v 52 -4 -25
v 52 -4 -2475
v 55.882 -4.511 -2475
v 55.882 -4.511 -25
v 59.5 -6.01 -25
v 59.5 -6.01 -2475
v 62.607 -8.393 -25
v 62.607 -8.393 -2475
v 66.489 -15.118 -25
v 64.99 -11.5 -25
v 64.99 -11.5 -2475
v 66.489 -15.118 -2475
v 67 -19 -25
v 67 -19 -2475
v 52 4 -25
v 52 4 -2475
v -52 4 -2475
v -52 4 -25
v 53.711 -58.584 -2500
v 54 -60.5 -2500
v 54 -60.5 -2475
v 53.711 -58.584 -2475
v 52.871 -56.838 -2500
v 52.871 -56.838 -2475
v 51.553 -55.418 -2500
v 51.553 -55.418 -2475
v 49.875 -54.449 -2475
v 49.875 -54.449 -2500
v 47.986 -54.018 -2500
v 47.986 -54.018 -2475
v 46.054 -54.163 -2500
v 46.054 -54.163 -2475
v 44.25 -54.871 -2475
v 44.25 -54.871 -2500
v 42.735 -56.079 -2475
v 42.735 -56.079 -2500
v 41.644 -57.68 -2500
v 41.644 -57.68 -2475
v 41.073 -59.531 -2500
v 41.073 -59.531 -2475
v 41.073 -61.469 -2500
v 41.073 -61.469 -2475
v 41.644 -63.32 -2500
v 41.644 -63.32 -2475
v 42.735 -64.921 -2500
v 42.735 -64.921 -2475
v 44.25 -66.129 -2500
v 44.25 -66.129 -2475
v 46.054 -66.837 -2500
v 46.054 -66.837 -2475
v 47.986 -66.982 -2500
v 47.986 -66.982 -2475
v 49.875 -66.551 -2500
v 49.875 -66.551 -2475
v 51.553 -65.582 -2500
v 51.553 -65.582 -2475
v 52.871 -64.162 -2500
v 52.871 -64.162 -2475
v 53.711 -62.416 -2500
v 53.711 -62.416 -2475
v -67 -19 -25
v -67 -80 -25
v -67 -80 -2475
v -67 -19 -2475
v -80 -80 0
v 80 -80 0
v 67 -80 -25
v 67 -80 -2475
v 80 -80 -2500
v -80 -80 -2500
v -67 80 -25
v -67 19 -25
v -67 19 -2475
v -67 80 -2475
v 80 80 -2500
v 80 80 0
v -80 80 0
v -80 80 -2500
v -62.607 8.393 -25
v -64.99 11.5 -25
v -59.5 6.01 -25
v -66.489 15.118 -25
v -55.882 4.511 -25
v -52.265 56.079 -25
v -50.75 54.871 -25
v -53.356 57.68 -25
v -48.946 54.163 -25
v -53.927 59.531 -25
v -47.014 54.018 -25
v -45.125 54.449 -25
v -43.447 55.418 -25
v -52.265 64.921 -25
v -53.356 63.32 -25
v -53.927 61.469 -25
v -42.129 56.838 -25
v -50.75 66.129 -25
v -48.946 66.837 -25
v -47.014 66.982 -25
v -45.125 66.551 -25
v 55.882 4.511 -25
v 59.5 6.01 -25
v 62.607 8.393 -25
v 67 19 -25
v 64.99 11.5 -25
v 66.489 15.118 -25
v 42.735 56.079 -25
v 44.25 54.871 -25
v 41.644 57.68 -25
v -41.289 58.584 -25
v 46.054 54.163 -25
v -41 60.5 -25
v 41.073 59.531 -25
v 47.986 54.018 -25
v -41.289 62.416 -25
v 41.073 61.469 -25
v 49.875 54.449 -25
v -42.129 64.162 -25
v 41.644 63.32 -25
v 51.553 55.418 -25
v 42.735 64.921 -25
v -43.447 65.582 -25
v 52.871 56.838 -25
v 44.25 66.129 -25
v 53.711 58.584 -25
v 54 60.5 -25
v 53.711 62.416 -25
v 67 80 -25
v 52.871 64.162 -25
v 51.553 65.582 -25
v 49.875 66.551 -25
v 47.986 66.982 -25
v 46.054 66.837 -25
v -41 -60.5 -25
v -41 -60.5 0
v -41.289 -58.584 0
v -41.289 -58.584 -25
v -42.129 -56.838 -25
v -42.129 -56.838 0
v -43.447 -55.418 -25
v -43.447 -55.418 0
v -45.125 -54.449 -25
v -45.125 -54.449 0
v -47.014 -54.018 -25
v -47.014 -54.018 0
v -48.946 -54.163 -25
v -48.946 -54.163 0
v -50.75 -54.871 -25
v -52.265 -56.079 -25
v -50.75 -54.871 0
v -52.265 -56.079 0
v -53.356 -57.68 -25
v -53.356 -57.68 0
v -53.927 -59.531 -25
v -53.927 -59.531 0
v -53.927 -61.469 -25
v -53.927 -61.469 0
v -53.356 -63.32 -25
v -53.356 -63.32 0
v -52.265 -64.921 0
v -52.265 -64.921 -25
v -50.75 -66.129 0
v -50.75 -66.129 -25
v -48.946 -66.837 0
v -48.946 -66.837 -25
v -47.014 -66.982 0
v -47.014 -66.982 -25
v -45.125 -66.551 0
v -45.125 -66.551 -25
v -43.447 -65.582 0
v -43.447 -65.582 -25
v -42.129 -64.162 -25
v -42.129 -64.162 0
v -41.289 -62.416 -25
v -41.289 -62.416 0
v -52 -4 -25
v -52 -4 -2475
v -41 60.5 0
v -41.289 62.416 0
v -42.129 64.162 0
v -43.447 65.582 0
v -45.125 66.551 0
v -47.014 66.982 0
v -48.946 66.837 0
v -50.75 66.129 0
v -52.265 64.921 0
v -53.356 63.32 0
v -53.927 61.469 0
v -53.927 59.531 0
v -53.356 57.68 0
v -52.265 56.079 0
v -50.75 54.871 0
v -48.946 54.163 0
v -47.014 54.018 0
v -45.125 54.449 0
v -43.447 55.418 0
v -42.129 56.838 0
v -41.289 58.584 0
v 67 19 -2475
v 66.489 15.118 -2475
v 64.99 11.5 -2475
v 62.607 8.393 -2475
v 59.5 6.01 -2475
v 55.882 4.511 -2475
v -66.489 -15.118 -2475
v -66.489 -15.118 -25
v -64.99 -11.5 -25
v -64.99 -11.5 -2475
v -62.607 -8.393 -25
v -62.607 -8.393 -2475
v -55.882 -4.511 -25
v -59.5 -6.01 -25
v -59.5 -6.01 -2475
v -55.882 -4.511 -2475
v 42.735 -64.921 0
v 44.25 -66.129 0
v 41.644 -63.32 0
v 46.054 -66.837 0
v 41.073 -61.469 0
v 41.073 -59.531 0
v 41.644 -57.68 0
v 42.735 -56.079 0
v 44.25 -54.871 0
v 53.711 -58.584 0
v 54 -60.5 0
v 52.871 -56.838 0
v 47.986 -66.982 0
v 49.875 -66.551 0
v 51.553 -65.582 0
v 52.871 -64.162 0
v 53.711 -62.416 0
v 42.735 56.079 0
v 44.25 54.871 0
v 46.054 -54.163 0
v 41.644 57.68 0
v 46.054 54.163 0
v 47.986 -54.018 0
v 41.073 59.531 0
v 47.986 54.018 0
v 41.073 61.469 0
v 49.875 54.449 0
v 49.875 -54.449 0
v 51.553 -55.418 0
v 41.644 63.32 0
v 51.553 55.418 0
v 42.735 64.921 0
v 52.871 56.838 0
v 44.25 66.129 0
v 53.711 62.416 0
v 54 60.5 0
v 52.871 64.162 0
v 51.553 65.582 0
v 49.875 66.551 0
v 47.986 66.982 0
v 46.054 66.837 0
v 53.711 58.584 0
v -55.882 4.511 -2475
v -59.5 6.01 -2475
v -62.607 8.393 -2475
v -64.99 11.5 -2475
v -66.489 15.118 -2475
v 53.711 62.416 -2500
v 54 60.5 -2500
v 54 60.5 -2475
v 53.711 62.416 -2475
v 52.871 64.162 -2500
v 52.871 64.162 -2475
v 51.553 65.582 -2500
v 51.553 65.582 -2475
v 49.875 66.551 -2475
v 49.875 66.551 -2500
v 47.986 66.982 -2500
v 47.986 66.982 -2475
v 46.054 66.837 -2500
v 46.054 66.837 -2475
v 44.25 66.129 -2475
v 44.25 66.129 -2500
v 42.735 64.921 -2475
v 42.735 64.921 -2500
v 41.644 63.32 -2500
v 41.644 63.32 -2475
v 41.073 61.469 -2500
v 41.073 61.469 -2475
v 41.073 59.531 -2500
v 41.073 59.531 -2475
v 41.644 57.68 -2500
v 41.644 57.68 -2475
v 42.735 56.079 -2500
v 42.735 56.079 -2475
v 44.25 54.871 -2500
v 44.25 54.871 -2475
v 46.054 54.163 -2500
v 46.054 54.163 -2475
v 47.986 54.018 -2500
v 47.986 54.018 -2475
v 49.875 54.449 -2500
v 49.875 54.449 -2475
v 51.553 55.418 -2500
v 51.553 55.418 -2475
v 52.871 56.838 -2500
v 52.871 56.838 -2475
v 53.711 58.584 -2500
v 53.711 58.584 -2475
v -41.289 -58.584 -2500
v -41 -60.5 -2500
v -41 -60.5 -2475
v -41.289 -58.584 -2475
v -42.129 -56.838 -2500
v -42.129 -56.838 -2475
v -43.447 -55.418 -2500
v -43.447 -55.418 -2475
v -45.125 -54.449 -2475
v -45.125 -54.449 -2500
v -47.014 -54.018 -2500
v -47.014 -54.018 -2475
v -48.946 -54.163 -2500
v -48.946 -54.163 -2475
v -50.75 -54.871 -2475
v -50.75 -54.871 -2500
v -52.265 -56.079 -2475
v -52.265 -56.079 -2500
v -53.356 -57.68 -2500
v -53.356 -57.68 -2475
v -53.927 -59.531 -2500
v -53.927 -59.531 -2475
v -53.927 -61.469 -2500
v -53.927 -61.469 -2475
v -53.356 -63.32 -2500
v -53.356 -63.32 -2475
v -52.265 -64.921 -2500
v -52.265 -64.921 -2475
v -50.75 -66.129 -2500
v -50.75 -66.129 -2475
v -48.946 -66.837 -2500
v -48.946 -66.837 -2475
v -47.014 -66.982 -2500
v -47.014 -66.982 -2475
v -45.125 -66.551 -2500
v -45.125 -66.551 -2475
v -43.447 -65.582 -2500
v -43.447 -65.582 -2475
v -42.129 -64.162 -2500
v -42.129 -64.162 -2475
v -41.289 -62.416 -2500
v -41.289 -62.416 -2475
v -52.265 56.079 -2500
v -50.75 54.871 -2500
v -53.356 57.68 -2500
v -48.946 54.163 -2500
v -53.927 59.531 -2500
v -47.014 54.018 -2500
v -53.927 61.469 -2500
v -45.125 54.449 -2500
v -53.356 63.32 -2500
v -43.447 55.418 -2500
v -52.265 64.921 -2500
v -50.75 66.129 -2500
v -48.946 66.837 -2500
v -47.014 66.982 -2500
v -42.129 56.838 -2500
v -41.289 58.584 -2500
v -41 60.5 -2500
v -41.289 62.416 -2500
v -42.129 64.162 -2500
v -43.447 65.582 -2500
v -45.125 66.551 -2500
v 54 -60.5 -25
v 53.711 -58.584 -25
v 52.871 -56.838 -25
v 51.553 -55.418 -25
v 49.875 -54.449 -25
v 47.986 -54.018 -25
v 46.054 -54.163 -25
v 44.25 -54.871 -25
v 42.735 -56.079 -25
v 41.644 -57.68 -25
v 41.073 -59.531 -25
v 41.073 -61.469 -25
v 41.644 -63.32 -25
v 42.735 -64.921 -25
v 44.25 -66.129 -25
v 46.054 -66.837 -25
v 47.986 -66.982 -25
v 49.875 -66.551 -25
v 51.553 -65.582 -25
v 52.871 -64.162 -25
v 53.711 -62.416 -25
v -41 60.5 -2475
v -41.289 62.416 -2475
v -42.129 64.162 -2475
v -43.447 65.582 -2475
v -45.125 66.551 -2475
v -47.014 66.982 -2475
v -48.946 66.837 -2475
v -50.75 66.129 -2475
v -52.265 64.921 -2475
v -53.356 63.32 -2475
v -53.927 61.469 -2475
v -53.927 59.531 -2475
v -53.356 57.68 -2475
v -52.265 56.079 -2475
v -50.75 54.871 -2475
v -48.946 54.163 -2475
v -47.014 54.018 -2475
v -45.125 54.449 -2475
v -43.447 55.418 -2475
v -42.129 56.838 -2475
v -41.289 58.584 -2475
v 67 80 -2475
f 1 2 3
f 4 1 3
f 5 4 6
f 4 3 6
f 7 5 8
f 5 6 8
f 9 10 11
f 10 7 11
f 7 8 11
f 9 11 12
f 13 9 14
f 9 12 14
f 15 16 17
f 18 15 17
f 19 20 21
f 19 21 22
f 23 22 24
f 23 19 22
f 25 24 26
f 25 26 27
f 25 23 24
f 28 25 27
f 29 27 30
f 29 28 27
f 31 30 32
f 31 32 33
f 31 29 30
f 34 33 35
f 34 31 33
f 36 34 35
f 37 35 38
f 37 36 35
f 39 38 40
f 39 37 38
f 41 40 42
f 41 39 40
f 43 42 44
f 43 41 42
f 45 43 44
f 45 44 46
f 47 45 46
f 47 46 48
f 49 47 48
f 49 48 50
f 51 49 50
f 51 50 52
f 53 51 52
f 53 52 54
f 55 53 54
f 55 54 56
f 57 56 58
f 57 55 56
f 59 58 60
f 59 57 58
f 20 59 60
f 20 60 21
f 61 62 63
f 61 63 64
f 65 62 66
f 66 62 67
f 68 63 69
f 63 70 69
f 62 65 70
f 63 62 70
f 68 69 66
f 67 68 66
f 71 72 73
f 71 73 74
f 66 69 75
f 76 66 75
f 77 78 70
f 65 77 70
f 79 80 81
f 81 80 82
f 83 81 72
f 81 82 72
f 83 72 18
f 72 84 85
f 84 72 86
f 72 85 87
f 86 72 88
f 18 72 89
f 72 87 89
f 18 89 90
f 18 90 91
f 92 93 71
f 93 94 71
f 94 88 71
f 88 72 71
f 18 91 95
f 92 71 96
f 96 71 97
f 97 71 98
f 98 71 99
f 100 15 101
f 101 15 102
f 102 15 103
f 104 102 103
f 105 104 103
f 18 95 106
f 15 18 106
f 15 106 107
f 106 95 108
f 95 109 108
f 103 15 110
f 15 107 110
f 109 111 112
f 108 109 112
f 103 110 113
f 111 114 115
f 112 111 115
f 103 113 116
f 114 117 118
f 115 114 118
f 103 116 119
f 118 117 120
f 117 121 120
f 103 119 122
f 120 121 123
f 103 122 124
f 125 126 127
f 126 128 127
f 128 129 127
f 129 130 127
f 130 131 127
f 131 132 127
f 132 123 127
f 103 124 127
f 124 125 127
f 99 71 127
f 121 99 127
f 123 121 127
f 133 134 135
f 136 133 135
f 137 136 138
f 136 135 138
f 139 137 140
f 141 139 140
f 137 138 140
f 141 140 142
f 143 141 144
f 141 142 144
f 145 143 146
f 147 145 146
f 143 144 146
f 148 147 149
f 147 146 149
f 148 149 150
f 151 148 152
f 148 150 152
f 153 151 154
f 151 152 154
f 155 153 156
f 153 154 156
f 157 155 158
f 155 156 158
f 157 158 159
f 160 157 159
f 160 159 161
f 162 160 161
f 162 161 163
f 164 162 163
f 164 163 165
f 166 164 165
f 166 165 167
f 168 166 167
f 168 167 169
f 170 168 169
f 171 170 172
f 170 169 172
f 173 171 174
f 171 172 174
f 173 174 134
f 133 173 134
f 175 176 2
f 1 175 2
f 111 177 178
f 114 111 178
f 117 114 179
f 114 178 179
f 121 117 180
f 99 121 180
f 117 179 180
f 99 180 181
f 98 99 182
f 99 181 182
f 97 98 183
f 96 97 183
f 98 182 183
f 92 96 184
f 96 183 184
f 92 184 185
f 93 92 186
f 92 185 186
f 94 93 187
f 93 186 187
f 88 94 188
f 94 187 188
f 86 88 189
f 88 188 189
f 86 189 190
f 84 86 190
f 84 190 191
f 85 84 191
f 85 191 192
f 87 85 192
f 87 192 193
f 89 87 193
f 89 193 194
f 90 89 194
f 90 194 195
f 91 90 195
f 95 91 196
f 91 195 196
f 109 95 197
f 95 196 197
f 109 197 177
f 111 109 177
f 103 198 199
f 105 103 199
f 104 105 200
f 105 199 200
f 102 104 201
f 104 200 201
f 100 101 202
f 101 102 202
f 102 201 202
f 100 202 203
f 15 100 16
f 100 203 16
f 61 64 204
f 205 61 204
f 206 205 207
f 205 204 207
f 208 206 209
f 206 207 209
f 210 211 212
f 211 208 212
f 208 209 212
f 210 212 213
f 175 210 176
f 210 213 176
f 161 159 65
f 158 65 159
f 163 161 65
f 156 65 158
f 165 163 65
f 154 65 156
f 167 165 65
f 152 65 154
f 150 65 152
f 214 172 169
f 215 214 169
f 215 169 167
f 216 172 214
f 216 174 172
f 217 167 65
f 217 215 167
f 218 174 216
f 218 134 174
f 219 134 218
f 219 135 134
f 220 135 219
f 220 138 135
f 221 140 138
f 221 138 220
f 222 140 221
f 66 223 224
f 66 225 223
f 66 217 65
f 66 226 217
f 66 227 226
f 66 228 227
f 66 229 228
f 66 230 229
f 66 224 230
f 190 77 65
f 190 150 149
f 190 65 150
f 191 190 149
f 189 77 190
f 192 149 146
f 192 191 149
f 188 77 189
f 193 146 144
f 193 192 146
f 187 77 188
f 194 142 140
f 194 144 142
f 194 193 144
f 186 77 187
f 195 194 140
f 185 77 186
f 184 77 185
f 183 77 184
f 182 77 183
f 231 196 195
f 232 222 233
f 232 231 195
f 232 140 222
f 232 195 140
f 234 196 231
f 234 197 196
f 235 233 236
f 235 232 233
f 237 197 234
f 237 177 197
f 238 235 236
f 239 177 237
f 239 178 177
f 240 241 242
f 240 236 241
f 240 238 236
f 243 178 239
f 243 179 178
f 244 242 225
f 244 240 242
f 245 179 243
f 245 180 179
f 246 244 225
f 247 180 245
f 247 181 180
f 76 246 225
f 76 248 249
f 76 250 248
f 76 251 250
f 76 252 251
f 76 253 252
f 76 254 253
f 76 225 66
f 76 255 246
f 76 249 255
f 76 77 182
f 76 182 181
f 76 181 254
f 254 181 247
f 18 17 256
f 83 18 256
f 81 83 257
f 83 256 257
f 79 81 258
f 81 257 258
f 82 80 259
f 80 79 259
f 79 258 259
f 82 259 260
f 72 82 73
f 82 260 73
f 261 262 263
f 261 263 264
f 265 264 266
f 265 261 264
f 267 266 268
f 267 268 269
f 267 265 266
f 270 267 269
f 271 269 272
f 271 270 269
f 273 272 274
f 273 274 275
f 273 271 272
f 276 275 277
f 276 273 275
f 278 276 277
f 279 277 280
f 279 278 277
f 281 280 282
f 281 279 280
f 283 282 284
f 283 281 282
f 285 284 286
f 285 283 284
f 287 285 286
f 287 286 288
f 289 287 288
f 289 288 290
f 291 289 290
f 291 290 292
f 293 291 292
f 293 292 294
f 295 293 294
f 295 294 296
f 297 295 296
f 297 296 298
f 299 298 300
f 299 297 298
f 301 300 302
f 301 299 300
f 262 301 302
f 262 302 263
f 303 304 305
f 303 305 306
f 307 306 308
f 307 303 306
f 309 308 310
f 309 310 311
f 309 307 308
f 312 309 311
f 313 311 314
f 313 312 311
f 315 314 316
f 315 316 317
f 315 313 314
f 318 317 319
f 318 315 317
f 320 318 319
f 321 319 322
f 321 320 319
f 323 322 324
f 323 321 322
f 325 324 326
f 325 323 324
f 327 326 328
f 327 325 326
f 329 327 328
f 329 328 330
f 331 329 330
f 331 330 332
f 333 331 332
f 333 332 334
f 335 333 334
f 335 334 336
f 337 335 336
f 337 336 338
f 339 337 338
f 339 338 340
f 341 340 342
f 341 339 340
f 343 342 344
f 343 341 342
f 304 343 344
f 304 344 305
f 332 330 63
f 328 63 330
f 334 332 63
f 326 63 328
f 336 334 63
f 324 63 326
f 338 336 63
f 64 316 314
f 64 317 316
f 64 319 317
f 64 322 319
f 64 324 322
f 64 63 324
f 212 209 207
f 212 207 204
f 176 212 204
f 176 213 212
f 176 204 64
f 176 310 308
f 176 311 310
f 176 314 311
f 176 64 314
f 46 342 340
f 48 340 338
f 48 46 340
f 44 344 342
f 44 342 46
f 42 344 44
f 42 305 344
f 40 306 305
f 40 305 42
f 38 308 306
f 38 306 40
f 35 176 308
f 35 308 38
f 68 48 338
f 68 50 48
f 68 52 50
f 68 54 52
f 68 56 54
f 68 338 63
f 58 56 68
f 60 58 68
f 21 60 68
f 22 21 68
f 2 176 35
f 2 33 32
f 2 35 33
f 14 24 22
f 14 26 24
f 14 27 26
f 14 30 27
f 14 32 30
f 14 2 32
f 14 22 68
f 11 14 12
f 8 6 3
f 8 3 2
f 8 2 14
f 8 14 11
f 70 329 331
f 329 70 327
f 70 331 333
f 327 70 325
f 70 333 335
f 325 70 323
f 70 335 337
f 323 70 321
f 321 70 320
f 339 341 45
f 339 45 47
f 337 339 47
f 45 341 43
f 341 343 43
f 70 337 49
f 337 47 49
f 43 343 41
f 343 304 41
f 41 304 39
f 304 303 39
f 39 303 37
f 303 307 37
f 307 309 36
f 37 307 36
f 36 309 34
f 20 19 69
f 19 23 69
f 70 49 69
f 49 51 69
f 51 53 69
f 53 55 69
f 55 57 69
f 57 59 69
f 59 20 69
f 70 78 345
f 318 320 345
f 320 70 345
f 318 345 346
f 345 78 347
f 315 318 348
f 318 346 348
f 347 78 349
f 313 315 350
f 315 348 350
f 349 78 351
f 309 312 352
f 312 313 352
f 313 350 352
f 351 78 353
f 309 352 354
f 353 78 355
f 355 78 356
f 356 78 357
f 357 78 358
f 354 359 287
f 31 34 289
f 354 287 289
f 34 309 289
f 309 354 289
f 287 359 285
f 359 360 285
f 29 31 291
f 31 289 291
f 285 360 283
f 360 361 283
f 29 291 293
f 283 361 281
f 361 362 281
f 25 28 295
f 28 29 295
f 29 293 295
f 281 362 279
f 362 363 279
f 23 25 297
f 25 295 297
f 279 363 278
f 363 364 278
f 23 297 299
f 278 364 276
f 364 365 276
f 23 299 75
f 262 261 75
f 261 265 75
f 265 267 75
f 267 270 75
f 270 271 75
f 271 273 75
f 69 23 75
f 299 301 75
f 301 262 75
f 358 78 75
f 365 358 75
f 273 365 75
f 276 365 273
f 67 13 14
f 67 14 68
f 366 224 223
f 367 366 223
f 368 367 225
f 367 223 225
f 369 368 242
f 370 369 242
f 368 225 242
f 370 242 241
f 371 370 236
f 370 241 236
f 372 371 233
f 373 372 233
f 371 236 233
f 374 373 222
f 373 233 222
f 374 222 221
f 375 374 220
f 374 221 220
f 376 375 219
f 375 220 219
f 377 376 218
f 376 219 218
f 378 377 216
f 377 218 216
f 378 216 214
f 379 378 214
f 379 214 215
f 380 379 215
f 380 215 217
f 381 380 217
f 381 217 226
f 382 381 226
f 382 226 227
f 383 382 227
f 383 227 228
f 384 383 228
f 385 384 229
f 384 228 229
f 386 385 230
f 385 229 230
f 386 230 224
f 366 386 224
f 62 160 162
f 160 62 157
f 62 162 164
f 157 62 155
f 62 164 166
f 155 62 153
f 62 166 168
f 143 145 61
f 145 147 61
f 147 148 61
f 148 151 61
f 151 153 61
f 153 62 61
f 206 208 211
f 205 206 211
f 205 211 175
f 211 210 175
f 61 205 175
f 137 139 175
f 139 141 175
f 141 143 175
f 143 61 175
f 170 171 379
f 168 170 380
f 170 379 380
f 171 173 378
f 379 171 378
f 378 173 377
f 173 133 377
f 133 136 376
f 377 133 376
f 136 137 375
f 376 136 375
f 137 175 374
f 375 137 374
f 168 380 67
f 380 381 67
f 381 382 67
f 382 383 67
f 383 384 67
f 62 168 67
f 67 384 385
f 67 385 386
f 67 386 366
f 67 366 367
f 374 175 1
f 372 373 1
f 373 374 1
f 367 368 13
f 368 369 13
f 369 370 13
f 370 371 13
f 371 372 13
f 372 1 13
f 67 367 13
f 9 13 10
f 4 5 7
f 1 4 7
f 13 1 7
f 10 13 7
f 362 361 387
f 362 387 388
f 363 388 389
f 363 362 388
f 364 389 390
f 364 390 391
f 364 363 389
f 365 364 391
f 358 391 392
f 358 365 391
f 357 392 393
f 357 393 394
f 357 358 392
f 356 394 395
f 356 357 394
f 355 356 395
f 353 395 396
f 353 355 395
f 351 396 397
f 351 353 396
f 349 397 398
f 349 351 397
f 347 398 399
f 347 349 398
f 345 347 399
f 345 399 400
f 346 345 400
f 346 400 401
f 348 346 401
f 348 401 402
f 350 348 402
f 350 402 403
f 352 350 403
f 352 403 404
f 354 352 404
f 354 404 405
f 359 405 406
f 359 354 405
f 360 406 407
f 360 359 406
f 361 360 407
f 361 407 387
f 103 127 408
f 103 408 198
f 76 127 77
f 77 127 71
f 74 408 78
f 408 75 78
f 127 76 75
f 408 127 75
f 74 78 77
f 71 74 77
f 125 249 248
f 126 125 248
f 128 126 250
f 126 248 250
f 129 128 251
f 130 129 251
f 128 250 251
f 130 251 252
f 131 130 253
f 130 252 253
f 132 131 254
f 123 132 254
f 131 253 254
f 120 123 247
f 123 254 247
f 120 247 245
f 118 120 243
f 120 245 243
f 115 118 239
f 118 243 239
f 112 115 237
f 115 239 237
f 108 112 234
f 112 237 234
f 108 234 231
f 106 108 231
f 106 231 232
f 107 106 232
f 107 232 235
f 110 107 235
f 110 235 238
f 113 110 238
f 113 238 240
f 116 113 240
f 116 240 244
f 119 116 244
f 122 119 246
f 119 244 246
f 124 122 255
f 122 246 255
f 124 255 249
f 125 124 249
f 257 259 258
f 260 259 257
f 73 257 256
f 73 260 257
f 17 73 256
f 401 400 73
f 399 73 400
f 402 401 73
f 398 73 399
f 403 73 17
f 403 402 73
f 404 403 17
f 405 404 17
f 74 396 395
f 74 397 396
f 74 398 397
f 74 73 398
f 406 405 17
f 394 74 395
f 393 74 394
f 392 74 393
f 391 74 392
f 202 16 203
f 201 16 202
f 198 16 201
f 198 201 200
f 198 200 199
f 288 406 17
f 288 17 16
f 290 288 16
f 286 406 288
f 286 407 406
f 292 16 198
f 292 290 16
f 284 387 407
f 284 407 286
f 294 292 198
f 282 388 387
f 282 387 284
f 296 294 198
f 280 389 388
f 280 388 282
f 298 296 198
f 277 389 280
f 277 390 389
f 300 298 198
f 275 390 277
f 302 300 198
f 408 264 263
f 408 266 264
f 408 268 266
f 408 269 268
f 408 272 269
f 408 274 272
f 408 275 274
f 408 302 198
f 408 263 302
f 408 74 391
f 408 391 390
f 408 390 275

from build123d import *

# Parameters (mm, degrees)
F2_DEPTH = 1250
F1_R     = 6.5
F3_DEPTH = 25


with BuildPart() as f2:
    # F1 (on Top) → F2 (new body)
    with BuildSketch(Plane.XY):
        with BuildLine():
            Line((-80, 80), (-80, -80))
            Line((-80, -80), (-67, -80))
            Line((-67, -80), (-67, -19))
            ThreePointArc((-67, -19), (-62.6066017178, -8.3933982822), (-52, -4))
            Line((-52, -4), (52, -4))
            ThreePointArc((52, -4), (62.6066017178, -8.3933982822), (67, -19))
            Line((67, -19), (67, -80))
            Line((67, -80), (80, -80))
            Line((80, -80), (80, 80))
            Line((80, 80), (67, 80))
            Line((67, 80), (67, 19))
            ThreePointArc((67, 19), (62.6066017178, 8.3933982822), (52, 4))
            Line((52, 4), (-52, 4))
            ThreePointArc((-52, 4), (-62.6066017178, 8.3933982822), (-67, 19))
            Line((-67, 19), (-67, 80))
            Line((-67, 80), (-80, 80))
        make_face()
    extrude(amount=-F2_DEPTH)

    # F1 (on Top) → F3 (join)
    with BuildSketch(Plane.XY):
        with BuildLine():
            Line((67, 80), (-67, 80))
            Line((-67, 80), (-67, 19))
            ThreePointArc((-67, 19), (-62.6066017178, 8.3933982822), (-52, 4))
            Line((-52, 4), (52, 4))
            ThreePointArc((52, 4), (62.6066017178, 8.3933982822), (67, 19))
            Line((67, 19), (67, 80))
        make_face()
        with Locations((-47.5, 60.5)):
            Circle(F1_R, mode=Mode.SUBTRACT)
        with Locations((47.5, 60.5)):
            Circle(F1_R, mode=Mode.SUBTRACT)
        with BuildLine():
            Line((-80, 80), (-80, -80))
            Line((-80, -80), (-67, -80))
            Line((-67, -80), (-67, -19))
            ThreePointArc((-67, -19), (-62.6066017178, -8.3933982822), (-52, -4))
            Line((-52, -4), (52, -4))
            ThreePointArc((52, -4), (62.6066017178, -8.3933982822), (67, -19))
            Line((67, -19), (67, -80))
            Line((67, -80), (80, -80))
            Line((80, -80), (80, 80))
            Line((80, 80), (67, 80))
            Line((67, 80), (67, 19))
            ThreePointArc((67, 19), (62.6066017178, 8.3933982822), (52, 4))
            Line((52, 4), (-52, 4))
            ThreePointArc((-52, 4), (-62.6066017178, 8.3933982822), (-67, 19))
            Line((-67, 19), (-67, 80))
            Line((-67, 80), (-80, 80))
        make_face()
        with BuildLine():
            Line((-67, -19), (-67, -80))
            Line((-67, -80), (67, -80))
            Line((67, -80), (67, -19))
            ThreePointArc((67, -19), (62.6066017178, -8.3933982822), (52, -4))
            Line((52, -4), (-52, -4))
            ThreePointArc((-52, -4), (-62.6066017178, -8.3933982822), (-67, -19))
        make_face()
        with Locations((-47.5, -60.5)):
            Circle(F1_R, mode=Mode.SUBTRACT)
        with Locations((47.5, -60.5)):
            Circle(F1_R, mode=Mode.SUBTRACT)
    extrude(amount=-F3_DEPTH)

    # F4: F2 across face


with BuildPart() as f2_1:
    add(f2.part)
    add(f2.part.mirror(Plane(origin=(0, 0, -1250), x_dir=(1, 0, 0), z_dir=(0, 0, -1))))


solid = f2_1.part
